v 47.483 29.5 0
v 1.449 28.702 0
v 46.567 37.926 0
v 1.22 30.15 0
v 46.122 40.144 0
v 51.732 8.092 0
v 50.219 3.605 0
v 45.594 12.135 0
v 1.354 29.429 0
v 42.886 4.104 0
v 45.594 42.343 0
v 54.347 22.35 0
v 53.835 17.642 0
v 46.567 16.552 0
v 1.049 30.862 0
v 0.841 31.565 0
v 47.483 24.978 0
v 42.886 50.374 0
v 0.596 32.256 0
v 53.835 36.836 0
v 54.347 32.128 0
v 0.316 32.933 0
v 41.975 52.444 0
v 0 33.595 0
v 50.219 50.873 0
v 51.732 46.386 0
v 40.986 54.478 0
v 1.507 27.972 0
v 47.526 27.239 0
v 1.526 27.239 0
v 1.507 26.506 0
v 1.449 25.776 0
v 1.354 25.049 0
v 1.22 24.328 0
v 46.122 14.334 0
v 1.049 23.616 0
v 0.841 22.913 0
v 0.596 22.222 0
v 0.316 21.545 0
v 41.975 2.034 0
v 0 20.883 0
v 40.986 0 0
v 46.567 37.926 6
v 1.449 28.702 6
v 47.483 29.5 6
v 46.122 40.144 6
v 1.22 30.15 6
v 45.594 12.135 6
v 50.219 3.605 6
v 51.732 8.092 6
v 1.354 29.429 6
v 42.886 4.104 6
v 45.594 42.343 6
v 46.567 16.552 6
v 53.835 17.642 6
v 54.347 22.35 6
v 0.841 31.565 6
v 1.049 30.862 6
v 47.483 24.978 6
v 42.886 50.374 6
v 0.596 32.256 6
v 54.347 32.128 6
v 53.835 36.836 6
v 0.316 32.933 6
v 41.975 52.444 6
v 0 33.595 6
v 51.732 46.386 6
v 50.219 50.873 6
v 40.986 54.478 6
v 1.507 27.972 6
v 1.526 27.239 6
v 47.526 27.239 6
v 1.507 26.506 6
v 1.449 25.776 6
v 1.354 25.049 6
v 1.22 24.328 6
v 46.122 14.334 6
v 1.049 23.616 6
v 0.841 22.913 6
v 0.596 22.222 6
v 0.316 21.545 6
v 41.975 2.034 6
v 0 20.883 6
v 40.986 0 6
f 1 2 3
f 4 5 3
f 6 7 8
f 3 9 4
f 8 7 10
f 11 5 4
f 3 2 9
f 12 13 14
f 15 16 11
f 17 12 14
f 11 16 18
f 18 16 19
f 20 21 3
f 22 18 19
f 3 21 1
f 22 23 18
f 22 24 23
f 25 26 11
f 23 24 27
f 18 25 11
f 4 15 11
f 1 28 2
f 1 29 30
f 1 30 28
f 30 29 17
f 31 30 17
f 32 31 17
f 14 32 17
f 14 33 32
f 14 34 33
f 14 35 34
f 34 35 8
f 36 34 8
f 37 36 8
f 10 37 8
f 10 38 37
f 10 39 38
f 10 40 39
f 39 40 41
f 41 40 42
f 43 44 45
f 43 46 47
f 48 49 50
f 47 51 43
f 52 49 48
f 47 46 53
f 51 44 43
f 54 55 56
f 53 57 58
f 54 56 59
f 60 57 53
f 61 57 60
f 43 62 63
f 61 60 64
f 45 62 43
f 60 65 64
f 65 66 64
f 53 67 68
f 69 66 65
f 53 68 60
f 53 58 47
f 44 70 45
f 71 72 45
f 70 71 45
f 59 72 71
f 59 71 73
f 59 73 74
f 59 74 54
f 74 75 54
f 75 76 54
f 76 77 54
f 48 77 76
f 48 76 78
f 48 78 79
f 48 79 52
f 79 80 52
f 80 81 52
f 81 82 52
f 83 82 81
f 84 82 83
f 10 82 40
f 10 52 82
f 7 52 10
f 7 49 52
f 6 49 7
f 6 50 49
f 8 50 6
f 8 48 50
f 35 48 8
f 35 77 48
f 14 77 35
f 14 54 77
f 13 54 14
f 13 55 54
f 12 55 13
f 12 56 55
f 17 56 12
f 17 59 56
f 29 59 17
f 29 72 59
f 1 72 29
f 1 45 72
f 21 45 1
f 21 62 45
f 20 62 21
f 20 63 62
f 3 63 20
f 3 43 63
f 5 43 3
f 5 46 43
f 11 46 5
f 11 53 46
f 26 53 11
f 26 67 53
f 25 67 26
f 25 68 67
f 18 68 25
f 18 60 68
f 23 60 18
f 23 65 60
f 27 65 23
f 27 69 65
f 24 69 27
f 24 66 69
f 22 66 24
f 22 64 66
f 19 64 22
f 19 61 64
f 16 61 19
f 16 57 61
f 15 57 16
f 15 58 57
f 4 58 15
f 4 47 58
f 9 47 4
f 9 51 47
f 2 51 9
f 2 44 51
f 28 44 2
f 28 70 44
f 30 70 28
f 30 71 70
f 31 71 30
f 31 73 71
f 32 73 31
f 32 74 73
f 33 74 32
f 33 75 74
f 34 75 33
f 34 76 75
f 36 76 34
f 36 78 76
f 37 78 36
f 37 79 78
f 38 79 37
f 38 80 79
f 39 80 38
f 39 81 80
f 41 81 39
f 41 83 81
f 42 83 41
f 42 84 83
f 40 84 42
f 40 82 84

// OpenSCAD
$fn = 32;

// ----------------------------------------------------------------------
// Gear sector: 4 teeth on 54 degrees
// ----------------------------------------------------------------------

// --- parameters (mm) ---
sector_angle = 54;        // sector angle, degrees
root_r = 60;              // root circle radius
tooth_h = 7;              // tooth height over the root circle
teeth = 4;                // number of teeth on the sector
hub_r = 14;               // hub bore radius
plate_t = 6;              // sector thickness, Z
arc_step = 3;             // sampling step of the root/hub arcs, degrees

tip_r = root_r + tooth_h;  // tip circle radius

profile = [[40.986, 0], [41.975, 2.034], [42.886, 4.104], [50.219, 3.605], [51.732, 8.092], [45.594, 12.135], [46.122, 14.334], [46.567, 16.552], [53.835, 17.642], [54.347, 22.35], [47.483, 24.978], [47.526, 27.239], [47.483, 29.5], [54.347, 32.128], [53.835, 36.836], [46.567, 37.926], [46.122, 40.144], [45.594, 42.343], [51.732, 46.386], [50.219, 50.873], [42.886, 50.374], [41.975, 52.444], [40.986, 54.478], [0, 33.595], [0.316, 32.933], [0.596, 32.256], [0.841, 31.565], [1.049, 30.862], [1.22, 30.15], [1.354, 29.429], [1.449, 28.702], [1.507, 27.972], [1.526, 27.239], [1.507, 26.506], [1.449, 25.776], [1.354, 25.049], [1.22, 24.328], [1.049, 23.616], [0.841, 22.913], [0.596, 22.222], [0.316, 21.545], [0, 20.883]];  // primary outline, 42 points, counter clockwise

// --- the one profile operation ---
linear_extrude(height = plate_t) polygon(points = profile);
